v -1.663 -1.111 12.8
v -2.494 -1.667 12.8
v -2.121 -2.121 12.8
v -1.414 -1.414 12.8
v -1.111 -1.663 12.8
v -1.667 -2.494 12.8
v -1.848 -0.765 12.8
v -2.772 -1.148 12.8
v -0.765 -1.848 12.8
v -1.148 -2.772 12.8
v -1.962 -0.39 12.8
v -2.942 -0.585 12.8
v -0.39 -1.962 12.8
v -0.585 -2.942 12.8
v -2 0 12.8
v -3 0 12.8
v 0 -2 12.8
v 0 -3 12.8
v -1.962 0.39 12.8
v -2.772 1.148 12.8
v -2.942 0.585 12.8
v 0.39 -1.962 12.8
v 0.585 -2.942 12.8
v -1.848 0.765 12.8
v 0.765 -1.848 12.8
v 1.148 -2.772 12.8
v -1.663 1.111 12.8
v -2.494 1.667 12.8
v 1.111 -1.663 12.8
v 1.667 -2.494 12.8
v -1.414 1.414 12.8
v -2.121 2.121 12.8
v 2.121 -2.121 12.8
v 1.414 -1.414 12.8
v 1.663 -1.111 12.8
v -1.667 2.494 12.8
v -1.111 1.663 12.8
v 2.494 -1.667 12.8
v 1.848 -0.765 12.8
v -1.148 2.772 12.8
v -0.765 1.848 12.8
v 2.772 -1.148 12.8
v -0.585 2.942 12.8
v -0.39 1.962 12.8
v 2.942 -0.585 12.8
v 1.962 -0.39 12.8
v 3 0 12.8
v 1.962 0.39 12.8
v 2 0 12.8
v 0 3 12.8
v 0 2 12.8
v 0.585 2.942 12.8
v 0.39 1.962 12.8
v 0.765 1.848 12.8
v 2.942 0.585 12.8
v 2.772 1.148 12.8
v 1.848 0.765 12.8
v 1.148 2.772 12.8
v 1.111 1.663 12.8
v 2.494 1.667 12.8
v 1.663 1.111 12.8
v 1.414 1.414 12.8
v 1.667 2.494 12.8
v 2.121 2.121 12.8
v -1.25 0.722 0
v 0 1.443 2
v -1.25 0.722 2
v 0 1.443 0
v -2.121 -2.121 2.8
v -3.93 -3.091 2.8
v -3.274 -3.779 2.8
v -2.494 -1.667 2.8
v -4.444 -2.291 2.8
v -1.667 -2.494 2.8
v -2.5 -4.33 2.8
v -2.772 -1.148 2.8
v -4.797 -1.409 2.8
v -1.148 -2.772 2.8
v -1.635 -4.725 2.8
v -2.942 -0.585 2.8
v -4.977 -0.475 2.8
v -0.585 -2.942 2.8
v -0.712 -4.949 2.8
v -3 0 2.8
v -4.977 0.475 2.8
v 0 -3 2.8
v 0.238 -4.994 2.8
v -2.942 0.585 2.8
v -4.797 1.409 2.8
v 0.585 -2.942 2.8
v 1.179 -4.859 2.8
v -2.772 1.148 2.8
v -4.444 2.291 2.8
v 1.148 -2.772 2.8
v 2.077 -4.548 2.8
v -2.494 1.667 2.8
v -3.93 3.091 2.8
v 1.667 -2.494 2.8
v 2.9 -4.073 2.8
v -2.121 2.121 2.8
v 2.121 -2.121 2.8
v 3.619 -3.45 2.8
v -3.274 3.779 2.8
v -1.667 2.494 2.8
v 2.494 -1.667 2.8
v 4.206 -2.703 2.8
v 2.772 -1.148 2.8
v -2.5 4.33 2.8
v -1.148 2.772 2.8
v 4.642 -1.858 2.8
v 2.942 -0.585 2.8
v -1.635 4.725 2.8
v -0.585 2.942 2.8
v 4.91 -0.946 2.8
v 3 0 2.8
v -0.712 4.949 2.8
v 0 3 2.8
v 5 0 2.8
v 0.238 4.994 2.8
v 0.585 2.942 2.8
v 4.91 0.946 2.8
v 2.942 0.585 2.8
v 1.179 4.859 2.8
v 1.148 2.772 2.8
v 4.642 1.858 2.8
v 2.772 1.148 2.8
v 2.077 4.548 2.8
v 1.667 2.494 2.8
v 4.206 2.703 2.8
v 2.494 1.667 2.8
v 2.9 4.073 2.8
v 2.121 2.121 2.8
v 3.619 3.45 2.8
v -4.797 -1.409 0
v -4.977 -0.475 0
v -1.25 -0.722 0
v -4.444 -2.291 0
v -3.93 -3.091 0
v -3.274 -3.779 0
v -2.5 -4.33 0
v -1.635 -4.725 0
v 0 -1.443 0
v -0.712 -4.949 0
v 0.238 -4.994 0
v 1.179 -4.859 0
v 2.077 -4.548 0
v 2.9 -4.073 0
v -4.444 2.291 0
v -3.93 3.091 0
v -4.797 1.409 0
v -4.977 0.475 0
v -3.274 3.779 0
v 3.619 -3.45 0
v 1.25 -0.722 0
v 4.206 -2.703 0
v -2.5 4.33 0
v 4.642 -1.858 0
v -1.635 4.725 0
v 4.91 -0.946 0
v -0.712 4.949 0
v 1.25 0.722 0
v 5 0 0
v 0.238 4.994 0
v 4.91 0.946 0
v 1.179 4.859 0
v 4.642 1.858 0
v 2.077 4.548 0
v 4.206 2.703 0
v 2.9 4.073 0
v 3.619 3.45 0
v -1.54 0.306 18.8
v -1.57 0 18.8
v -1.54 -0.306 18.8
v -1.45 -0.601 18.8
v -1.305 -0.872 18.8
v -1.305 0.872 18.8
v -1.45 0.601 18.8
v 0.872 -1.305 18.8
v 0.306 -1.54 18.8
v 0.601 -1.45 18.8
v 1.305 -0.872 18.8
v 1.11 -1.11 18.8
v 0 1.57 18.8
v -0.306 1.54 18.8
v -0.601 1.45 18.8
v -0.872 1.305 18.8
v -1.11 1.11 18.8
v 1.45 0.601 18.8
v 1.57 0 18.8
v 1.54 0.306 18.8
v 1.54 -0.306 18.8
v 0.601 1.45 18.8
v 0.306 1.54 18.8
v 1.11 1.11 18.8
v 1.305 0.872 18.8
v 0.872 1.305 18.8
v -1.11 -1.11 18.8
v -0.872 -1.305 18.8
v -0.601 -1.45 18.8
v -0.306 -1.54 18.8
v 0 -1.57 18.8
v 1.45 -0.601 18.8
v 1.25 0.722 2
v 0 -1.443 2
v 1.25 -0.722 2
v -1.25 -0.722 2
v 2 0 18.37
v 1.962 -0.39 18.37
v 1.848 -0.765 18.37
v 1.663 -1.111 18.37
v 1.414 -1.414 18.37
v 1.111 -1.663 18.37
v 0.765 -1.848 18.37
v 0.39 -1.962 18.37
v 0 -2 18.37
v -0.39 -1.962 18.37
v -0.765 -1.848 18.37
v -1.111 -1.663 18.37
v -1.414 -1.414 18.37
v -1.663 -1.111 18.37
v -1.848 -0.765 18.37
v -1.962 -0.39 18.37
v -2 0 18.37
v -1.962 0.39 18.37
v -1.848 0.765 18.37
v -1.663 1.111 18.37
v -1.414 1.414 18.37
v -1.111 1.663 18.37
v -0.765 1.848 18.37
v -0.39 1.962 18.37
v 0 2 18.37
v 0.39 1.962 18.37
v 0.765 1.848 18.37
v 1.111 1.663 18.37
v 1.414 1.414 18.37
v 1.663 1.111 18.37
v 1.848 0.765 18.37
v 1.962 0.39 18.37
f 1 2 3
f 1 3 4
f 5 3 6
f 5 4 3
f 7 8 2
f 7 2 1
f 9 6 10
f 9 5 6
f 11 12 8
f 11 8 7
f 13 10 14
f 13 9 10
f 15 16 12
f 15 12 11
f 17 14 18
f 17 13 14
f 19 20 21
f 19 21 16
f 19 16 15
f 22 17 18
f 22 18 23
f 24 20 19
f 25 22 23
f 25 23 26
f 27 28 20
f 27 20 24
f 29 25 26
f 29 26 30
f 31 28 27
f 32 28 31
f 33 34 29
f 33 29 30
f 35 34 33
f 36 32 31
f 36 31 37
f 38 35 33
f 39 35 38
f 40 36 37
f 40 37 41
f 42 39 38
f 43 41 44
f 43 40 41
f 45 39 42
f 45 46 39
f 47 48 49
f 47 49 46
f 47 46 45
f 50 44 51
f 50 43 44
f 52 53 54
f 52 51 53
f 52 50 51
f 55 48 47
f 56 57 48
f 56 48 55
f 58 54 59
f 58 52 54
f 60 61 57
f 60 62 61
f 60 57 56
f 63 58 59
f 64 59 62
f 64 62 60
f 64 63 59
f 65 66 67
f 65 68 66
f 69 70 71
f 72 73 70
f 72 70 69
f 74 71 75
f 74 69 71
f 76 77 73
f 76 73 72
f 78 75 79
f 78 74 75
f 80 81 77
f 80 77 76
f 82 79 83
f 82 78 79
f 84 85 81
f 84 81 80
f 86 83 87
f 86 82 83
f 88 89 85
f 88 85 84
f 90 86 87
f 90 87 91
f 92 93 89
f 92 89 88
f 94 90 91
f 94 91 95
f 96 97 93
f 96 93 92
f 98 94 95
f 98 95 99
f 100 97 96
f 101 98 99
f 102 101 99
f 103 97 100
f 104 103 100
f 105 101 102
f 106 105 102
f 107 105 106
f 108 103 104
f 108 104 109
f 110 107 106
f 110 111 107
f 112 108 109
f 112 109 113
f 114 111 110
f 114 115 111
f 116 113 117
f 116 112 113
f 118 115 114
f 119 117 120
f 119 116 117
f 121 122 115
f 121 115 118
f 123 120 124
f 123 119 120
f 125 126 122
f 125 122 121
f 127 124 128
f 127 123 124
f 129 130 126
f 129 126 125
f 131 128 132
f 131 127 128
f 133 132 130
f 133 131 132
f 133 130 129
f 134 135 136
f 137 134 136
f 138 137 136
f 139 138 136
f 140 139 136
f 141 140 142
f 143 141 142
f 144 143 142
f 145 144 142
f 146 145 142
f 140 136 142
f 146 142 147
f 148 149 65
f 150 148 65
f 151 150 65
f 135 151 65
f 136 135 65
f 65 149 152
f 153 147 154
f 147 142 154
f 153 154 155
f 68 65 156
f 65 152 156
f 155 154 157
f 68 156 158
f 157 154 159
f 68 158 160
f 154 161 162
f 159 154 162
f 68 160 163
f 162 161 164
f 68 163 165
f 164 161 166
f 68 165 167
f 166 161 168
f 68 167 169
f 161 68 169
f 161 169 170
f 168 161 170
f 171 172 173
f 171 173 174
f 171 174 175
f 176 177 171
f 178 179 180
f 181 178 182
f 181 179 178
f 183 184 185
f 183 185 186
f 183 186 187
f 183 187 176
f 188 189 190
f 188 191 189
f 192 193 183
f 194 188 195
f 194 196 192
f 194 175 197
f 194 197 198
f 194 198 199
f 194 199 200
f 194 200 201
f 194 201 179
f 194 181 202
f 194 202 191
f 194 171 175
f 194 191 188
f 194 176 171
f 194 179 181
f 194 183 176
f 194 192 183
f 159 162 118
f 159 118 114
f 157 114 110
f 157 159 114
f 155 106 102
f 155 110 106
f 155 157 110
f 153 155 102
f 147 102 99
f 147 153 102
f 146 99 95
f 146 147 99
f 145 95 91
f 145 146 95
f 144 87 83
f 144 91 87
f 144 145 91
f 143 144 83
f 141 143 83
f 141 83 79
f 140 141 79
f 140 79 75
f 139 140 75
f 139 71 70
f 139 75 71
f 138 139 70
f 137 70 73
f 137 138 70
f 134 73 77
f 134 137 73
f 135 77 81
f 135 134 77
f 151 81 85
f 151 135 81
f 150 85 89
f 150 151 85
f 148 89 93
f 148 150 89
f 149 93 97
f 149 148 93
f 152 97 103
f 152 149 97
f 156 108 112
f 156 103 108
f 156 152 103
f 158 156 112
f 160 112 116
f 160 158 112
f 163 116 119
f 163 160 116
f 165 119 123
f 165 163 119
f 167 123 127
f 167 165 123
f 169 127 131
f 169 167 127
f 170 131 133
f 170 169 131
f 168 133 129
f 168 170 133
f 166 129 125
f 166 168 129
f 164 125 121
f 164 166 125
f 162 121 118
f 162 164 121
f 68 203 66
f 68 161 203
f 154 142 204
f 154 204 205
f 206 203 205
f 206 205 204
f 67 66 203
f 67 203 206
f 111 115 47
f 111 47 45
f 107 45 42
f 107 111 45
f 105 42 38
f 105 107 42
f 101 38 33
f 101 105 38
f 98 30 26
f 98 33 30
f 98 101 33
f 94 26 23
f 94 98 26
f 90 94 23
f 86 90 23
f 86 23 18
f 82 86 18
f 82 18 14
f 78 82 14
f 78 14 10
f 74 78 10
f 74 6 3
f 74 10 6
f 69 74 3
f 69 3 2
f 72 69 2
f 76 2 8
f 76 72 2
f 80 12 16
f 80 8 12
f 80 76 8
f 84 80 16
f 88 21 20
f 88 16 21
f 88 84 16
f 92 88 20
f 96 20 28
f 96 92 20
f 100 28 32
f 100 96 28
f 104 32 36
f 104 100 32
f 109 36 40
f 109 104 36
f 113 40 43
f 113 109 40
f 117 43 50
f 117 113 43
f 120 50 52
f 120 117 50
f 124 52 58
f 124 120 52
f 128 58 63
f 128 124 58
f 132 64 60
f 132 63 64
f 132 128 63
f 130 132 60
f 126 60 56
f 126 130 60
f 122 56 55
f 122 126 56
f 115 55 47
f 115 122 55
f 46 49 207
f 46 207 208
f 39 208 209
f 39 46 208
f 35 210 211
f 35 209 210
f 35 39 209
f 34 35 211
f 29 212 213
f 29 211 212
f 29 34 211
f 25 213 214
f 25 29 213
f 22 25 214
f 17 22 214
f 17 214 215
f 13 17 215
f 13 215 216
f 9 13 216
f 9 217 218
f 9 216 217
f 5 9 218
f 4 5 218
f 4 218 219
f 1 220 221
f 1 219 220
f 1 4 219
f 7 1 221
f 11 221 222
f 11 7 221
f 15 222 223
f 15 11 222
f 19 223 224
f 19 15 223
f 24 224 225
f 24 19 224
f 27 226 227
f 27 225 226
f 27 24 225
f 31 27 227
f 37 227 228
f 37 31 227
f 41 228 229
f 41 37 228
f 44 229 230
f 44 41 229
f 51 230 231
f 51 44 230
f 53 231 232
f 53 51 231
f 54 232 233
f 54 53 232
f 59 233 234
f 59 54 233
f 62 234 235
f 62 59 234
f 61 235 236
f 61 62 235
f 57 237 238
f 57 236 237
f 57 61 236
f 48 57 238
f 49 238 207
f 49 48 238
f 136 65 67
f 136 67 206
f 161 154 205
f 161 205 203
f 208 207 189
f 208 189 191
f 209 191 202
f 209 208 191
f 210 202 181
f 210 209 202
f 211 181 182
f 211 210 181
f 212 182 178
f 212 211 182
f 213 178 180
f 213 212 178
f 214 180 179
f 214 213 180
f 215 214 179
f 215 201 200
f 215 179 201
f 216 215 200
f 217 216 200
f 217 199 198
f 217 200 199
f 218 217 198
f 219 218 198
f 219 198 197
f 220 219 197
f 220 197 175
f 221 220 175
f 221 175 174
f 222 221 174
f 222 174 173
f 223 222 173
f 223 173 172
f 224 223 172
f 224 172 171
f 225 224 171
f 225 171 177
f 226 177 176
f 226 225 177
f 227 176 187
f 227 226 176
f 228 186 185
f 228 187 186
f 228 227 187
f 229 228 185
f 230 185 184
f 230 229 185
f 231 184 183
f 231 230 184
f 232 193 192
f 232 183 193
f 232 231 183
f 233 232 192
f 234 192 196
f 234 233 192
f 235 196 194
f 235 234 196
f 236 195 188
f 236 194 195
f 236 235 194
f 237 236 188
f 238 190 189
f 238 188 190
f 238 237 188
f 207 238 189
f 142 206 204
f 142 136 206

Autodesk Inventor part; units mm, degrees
ref_plane "YZ Plane" through (0, 0, 0) normal (1, 0, 0) x (0, 1, 0)
ref_plane "XZ Plane" through (0, 0, 0) normal (0, 1, 0) x (-1, 0, 0)
ref_plane "XY Plane" through (0, 0, 0) normal (0, 0, 1) x (1, 0, 0)
sketch "Sketch1" plane through (0, 0, 0) normal (0, 1, 0) x (-1, 0, 0)
  line L0 (0, 0) -> (0, 18.8)
  line L1 (0, 18.8) -> (-2, 18.8)
  line L2 (-2, 18.8) -> (-2, 12.8)
  line L3 (-2, 12.8) -> (-3, 12.8)
  line L4 (-3, 12.8) -> (-3, 2.8)
  line L5 (-3, 2.8) -> (-5, 2.8)
  line L6 (-5, 2.8) -> (-5, 0)
  line L7 (-5, 0) -> (0, 0)
  dimension "d0" = 10
  dimension "d1" = 6
  dimension "d2" = 4
  dimension "d3" = 6
  dimension "d4" = 10
  dimension "d5" = 2.8
revolve "Revolution1" add sketch "Sketch1" angle 360 about axis through (0, 0, 0) along (0, 0, 1)
thread "Thread1" size "M4x0.7" class "6g" standard "ANSI Metric M Profile" length 6 offset 1.2
sketch "Sketch2" plane through (0, 0, 0) normal (0, 0, -1) x (-1, 0, 0)
  line L0 (0, 1.4434) -> (1.25, 0.7217)
  line L1 (1.25, 0.7217) -> (1.25, -0.7217)
  line L2 (1.25, -0.7217) -> (0, -1.4434)
  line L3 (0, -1.4434) -> (-1.25, -0.7217)
  line L4 (-1.25, -0.7217) -> (-1.25, 0.7217)
  line L5 (-1.25, 0.7217) -> (0, 1.4434)
  point P0 (0, 0)
  point P1 (0, 0)
  dimension "d9" = 2.5
extrude "Extrusion1" cut sketch "Sketch2" against normal blind 2
chamfer "Chamfer1" distance 0.43 angle 45 1 edges at (-2, 0, 18.8)
properties part number "DBSY4-10-6" material "Stainless Steel AISI 304"
